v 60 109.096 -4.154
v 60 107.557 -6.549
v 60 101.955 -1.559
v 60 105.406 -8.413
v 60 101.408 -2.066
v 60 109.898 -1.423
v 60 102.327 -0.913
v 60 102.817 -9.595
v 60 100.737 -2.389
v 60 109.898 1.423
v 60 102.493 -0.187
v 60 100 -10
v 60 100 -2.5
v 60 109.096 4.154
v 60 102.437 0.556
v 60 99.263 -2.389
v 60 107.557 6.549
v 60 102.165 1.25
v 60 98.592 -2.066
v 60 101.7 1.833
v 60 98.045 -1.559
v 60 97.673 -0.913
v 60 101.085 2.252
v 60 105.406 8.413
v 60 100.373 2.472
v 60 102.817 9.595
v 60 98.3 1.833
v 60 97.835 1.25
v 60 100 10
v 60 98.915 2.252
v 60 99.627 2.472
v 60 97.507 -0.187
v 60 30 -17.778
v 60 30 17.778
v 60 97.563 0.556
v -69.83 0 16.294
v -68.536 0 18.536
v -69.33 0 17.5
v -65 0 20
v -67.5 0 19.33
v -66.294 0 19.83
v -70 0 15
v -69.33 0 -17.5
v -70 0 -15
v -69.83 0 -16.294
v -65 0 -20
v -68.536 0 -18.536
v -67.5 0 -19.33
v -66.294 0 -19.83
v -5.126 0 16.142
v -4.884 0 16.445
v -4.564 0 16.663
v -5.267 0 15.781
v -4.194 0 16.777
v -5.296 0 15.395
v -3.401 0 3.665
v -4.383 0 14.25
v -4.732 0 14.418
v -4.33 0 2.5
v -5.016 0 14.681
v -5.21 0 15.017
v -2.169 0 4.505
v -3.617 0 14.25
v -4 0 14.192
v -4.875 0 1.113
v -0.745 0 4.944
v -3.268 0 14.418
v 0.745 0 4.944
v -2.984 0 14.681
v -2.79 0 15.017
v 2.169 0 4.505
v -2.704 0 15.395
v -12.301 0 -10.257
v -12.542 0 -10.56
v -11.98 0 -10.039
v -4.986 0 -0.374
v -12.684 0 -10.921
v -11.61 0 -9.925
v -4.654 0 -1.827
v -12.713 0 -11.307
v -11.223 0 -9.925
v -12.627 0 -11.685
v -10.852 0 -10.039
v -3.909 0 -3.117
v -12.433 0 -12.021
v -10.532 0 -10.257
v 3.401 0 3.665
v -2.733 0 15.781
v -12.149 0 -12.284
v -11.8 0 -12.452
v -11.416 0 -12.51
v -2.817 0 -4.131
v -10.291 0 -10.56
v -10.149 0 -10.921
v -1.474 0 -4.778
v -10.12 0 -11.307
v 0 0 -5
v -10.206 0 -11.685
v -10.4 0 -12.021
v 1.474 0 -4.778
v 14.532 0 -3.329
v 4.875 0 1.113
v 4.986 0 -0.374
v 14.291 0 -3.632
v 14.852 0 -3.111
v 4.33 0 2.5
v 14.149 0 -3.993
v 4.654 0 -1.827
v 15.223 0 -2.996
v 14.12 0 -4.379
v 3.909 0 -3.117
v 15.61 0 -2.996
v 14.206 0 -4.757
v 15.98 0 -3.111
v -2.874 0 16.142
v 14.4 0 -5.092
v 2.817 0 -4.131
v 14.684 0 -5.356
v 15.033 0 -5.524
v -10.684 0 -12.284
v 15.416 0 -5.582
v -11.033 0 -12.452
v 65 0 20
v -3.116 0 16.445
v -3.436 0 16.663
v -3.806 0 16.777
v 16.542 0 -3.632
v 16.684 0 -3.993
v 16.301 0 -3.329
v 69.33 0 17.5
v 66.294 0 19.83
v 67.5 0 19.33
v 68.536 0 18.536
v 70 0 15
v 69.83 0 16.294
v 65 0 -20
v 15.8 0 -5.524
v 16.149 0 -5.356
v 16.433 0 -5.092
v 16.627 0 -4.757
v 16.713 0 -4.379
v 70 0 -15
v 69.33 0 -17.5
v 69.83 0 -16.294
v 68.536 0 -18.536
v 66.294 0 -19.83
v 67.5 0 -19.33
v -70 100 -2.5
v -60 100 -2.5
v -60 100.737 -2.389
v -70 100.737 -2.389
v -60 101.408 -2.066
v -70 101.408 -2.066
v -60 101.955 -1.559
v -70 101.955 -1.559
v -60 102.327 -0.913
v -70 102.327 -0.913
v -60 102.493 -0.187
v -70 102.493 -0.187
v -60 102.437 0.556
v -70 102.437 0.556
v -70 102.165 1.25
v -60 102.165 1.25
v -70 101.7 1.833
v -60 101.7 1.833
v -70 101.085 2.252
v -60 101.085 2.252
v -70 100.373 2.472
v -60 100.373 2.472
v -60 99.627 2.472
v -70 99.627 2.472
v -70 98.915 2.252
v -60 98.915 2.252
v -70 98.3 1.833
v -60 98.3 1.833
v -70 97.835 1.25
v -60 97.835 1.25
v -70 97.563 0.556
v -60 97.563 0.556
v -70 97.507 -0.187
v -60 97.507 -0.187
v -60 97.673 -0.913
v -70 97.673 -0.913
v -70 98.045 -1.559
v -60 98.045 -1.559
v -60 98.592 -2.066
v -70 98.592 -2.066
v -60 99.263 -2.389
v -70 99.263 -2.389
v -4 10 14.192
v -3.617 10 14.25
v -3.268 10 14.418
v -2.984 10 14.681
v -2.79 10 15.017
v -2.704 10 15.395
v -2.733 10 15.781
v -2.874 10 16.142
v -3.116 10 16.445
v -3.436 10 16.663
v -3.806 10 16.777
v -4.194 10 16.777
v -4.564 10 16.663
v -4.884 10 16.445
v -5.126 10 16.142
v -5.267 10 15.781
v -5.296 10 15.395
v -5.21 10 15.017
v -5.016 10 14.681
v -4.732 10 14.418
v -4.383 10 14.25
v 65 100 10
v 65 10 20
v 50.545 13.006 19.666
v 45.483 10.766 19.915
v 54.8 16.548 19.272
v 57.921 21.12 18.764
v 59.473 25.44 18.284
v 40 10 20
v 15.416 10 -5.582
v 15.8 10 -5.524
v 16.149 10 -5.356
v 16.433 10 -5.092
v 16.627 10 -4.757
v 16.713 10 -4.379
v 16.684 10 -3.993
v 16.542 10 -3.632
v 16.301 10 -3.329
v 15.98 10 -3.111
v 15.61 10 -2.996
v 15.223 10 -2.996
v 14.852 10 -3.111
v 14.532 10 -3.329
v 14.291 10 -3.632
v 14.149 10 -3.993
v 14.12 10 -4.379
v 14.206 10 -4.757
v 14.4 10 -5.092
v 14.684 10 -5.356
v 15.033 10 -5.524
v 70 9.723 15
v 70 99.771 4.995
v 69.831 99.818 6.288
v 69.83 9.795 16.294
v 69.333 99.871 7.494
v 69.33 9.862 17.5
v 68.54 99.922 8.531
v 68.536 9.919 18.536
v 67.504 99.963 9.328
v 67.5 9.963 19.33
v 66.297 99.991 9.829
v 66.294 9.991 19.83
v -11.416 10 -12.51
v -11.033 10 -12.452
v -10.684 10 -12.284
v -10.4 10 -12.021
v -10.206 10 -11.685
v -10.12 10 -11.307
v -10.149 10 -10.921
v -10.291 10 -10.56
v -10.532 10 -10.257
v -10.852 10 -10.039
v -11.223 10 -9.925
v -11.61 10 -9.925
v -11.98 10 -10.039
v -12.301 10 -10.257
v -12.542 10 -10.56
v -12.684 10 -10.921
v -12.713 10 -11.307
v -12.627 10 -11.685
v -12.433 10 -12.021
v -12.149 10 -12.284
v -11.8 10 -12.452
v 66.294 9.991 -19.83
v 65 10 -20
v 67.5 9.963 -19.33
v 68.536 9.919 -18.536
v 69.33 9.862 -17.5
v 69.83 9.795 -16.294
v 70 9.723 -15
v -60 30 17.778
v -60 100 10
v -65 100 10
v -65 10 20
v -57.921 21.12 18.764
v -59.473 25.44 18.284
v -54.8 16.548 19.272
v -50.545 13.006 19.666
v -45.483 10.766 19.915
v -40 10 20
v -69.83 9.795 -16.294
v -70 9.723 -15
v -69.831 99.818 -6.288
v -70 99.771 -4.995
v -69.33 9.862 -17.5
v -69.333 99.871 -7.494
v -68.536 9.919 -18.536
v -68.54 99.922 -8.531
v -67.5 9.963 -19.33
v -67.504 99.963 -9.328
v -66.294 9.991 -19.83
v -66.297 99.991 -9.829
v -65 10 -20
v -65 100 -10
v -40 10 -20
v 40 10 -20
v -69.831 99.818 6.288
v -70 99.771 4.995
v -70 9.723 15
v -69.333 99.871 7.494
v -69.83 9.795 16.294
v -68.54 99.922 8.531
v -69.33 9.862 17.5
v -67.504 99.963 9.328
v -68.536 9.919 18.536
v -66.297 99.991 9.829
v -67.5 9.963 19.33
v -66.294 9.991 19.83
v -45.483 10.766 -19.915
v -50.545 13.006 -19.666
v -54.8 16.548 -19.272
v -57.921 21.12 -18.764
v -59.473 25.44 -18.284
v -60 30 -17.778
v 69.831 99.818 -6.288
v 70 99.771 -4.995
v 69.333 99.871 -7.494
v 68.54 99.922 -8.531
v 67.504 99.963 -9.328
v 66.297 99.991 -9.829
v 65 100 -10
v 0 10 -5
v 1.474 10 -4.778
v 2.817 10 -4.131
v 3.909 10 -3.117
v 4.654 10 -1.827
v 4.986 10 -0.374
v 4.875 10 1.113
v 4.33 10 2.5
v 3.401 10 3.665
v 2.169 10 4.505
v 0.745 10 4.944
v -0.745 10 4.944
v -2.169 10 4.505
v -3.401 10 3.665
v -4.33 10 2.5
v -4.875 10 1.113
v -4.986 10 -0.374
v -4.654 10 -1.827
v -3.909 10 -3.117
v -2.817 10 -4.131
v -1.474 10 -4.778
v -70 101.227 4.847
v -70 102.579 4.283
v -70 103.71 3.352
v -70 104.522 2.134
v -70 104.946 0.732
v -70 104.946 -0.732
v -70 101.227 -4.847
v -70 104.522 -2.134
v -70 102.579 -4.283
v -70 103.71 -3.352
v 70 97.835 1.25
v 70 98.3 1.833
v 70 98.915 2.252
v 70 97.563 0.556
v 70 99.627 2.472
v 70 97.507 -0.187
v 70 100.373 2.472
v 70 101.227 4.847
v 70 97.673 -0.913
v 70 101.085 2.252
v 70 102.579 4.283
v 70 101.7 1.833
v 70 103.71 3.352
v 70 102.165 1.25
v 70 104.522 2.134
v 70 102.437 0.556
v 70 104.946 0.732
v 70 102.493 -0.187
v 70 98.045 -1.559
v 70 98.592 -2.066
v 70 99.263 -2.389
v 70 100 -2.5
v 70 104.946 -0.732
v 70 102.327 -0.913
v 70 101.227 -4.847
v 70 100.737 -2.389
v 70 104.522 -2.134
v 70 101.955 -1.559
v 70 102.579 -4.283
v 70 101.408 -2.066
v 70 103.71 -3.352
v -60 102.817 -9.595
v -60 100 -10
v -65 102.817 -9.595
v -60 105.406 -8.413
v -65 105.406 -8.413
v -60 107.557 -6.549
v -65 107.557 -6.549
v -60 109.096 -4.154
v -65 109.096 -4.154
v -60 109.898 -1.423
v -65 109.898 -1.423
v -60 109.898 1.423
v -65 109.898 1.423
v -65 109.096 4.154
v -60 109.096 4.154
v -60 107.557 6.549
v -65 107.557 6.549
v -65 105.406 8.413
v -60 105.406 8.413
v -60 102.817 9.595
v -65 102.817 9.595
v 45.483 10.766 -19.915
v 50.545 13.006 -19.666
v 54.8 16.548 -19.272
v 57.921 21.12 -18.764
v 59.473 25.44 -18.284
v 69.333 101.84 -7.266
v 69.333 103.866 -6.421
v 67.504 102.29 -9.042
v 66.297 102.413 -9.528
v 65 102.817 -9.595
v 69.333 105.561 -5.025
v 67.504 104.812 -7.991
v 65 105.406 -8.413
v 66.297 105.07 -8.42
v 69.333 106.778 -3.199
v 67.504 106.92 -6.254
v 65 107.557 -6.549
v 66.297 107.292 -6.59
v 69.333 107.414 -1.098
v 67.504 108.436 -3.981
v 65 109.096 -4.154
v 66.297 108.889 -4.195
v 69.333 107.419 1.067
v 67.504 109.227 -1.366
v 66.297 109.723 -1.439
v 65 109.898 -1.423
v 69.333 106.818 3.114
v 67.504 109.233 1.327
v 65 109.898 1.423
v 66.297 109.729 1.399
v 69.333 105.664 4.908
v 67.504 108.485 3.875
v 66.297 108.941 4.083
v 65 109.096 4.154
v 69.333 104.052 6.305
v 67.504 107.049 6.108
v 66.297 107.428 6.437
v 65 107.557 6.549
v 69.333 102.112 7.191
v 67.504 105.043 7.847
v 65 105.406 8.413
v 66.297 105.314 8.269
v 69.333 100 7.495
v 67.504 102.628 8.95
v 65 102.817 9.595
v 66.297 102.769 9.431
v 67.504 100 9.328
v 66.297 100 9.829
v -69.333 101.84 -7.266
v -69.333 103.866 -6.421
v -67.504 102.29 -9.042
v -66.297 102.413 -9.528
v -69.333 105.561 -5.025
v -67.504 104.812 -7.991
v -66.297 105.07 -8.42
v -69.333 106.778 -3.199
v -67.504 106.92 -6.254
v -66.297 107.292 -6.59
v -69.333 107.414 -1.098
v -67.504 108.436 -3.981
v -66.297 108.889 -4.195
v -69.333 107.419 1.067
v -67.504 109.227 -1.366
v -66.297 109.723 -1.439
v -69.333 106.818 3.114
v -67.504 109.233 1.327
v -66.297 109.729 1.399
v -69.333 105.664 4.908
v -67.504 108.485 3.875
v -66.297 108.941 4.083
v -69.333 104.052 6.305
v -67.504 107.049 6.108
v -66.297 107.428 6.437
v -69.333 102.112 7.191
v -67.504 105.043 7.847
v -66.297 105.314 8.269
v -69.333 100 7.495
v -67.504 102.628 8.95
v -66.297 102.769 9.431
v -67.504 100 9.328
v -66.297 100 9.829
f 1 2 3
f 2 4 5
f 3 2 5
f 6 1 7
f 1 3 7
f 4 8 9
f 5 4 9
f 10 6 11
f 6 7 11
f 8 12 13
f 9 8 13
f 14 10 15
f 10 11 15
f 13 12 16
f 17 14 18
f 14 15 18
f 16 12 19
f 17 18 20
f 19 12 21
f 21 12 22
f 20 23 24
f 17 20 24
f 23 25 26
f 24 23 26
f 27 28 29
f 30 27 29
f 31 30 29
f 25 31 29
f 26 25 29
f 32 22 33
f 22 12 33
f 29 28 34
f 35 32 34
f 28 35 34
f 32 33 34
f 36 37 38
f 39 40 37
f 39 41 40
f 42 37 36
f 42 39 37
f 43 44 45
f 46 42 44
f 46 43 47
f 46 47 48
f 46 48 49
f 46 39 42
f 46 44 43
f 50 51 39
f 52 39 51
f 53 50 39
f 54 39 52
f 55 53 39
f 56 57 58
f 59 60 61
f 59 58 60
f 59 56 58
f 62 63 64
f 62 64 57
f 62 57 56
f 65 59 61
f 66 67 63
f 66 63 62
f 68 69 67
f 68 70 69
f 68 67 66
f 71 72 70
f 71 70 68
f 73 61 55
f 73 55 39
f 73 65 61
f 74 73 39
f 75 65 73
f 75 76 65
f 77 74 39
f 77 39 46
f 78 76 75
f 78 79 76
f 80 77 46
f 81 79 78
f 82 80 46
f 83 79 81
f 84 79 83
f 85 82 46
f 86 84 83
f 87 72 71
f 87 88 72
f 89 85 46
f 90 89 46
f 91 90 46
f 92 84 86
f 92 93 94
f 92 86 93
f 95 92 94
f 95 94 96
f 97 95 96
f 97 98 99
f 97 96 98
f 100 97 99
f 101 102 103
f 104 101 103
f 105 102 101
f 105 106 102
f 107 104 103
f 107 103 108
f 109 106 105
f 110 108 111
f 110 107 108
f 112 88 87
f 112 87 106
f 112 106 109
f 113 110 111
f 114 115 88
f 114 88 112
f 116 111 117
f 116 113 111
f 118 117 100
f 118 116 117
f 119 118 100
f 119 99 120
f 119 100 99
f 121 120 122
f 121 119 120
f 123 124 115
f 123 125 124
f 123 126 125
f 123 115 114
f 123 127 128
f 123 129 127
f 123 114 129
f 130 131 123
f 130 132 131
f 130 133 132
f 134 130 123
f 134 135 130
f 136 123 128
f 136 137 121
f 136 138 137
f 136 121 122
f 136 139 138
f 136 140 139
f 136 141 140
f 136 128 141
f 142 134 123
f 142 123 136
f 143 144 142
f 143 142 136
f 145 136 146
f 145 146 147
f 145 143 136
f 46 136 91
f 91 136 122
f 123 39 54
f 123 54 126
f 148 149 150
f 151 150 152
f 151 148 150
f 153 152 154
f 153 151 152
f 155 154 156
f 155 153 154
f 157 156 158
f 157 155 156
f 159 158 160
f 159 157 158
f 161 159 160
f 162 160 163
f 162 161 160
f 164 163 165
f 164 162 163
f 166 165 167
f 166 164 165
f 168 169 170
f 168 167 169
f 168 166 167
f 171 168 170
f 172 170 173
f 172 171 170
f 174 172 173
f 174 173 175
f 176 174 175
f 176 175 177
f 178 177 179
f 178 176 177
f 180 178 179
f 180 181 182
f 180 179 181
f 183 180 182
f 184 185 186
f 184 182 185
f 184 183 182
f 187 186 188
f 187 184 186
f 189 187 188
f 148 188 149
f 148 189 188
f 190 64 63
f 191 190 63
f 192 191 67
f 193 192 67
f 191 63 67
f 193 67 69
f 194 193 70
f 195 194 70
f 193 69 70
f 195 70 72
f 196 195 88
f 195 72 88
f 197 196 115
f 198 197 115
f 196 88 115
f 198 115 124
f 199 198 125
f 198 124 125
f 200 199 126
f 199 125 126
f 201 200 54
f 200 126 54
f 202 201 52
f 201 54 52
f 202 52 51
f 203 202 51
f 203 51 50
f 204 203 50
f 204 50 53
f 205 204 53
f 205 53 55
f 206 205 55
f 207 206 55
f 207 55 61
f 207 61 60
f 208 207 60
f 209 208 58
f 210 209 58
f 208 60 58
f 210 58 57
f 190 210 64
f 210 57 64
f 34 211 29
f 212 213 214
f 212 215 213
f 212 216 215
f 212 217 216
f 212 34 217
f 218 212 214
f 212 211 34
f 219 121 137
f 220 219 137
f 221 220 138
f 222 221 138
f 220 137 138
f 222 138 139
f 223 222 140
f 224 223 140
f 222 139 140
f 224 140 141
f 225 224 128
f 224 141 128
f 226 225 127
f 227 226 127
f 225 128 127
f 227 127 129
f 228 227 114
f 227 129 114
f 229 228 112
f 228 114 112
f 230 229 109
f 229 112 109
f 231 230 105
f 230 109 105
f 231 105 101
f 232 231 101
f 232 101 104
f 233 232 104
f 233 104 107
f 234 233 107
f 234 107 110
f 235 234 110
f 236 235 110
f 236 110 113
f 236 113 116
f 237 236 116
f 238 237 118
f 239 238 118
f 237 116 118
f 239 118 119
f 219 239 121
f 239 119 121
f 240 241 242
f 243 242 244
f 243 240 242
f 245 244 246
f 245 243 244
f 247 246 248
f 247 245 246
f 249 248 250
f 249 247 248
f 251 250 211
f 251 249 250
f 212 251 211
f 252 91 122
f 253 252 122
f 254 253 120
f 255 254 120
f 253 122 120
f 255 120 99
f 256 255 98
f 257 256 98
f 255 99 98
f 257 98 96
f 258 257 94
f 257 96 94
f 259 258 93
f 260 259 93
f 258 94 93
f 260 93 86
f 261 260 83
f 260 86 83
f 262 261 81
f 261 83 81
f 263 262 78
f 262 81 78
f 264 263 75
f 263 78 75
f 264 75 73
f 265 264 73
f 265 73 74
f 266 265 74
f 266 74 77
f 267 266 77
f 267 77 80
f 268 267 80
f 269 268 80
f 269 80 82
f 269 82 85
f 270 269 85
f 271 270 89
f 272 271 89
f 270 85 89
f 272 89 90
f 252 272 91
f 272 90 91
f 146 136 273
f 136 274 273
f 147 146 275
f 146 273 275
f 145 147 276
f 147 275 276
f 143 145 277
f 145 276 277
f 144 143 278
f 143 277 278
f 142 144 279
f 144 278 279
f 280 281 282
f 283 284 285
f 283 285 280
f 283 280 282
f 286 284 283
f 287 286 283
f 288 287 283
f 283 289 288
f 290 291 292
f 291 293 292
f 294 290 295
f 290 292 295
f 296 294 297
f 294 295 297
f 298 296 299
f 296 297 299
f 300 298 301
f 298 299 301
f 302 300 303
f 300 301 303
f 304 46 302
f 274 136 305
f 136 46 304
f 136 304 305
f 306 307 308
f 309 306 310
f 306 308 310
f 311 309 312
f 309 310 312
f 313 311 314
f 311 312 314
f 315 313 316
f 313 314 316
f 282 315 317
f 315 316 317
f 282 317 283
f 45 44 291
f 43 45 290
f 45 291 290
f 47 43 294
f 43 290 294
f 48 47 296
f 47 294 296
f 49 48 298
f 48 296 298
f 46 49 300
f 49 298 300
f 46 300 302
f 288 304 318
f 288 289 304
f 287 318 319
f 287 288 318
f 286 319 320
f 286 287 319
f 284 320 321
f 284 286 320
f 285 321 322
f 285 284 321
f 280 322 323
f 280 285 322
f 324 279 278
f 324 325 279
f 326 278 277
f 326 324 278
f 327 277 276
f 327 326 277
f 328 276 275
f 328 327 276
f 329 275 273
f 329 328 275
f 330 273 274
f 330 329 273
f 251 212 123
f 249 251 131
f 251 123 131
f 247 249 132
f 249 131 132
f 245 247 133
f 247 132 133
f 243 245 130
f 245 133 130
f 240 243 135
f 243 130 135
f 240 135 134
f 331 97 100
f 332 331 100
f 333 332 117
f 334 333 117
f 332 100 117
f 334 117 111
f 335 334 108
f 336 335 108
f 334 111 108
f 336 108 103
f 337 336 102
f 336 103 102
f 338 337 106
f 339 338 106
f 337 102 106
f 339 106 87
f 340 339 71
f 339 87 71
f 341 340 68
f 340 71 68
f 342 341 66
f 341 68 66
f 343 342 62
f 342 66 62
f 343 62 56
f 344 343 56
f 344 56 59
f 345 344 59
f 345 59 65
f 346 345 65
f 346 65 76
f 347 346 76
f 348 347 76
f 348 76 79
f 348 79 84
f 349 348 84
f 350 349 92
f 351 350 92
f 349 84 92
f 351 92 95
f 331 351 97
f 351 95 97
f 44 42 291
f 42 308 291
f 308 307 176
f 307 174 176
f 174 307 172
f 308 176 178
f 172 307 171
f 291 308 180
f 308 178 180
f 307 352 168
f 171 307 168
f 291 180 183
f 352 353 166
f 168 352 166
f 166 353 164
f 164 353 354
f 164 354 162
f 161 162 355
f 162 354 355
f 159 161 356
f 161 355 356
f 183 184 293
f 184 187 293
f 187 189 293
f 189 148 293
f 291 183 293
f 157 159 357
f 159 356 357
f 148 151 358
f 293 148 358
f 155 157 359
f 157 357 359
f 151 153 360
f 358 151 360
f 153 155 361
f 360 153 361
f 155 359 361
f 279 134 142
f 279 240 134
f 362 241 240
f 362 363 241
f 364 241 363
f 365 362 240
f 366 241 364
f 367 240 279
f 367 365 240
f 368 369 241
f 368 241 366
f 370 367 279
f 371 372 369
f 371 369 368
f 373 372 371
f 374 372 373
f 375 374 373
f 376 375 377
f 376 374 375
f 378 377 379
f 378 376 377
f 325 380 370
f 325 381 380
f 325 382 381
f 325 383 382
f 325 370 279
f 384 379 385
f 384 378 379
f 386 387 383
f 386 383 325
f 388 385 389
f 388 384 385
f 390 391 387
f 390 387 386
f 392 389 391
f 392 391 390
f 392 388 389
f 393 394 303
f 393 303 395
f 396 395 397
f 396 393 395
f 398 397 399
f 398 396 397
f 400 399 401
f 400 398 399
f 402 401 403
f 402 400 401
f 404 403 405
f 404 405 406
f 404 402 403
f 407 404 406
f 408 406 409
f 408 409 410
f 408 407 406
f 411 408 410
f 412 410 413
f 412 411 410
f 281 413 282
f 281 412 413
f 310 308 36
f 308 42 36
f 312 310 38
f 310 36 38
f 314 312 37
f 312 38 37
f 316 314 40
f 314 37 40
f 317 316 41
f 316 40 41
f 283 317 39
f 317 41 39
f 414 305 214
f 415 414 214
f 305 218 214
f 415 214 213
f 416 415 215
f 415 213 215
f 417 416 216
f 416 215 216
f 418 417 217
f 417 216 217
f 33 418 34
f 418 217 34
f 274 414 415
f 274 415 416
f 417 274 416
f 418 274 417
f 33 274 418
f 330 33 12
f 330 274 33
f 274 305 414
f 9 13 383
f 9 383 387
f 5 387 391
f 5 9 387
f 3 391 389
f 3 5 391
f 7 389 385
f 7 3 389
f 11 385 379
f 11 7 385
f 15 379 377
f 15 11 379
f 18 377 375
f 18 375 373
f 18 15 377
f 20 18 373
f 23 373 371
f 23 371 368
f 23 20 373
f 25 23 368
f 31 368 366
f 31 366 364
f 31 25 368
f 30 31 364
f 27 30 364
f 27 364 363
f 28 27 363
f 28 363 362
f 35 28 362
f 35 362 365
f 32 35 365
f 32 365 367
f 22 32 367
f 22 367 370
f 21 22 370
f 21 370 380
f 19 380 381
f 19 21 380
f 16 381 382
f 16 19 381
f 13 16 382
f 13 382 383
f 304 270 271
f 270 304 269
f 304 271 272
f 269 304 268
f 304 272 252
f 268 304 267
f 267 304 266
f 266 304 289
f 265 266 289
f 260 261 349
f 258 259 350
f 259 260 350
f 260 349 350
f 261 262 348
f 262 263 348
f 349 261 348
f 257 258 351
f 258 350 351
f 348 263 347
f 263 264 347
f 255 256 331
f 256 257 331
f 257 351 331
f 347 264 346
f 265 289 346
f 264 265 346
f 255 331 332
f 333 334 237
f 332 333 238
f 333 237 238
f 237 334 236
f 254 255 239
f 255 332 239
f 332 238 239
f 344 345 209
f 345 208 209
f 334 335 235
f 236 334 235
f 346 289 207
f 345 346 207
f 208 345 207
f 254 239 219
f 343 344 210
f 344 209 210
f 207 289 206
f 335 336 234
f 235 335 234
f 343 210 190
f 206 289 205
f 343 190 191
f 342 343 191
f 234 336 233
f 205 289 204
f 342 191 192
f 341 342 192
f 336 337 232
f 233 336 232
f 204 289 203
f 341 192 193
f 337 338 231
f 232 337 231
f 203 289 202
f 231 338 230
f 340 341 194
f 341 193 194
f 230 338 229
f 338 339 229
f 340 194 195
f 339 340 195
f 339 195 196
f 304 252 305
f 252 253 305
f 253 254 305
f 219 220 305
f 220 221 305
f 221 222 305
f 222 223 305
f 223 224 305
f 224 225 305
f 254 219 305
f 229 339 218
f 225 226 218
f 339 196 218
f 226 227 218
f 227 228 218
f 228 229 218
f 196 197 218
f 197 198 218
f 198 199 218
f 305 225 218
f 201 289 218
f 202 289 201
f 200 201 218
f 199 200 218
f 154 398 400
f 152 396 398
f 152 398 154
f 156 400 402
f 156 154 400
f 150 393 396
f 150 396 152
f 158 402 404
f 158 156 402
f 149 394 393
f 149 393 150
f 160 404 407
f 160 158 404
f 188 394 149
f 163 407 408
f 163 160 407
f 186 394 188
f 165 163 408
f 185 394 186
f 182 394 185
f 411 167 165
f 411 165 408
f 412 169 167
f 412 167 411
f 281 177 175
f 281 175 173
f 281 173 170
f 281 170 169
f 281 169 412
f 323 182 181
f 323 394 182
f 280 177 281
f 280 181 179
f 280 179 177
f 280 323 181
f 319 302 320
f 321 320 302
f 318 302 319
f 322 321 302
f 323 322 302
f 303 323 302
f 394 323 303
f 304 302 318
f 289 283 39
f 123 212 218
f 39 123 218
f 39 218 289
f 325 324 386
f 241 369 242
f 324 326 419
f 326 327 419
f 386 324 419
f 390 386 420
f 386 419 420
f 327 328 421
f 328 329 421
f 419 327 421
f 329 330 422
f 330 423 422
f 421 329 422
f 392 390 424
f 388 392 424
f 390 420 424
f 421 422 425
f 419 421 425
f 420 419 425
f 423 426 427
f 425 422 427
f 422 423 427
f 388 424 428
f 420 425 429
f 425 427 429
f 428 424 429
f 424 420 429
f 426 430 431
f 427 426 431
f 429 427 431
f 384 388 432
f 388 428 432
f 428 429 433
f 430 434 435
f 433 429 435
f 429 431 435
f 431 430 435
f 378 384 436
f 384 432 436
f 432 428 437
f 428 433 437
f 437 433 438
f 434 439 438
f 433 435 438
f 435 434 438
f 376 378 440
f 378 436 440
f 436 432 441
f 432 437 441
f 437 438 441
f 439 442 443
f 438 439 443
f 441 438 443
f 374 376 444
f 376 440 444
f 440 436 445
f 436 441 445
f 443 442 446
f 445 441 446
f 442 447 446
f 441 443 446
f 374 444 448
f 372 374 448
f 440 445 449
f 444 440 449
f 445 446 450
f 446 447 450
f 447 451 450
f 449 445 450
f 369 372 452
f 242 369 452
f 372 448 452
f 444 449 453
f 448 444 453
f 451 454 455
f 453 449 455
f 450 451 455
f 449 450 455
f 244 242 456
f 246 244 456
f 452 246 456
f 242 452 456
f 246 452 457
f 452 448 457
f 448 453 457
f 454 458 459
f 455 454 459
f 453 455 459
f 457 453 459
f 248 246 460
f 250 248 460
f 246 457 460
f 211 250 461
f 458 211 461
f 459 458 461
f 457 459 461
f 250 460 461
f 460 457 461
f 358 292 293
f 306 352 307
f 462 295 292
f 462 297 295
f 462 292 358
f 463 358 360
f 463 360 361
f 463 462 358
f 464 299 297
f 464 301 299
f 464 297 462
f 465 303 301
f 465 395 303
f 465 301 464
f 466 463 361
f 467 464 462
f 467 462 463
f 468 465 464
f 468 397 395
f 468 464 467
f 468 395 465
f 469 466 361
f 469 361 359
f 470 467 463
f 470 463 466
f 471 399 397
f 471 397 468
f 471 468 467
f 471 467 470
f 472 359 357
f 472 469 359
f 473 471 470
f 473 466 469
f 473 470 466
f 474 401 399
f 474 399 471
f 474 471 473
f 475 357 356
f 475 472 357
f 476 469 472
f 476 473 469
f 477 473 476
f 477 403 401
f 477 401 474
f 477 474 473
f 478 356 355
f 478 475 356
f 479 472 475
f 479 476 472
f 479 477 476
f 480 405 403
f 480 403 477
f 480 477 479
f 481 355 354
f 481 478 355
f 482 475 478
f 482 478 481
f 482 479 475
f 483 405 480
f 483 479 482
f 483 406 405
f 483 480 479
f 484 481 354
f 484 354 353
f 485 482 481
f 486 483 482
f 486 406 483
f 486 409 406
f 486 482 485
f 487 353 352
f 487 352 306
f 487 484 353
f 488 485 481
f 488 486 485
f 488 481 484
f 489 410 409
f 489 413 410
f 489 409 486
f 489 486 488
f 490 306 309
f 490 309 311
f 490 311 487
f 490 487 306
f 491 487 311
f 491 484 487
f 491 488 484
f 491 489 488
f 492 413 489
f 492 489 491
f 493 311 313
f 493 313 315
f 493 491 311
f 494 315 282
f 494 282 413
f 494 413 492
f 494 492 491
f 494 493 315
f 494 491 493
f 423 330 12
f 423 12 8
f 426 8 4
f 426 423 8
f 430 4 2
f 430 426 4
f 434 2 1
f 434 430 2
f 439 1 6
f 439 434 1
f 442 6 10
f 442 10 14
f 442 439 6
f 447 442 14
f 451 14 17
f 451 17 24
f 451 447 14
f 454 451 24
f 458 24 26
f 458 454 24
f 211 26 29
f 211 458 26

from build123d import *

# Parameters (mm, degrees)
SKETCH1_R           = 2.5
BOSS_EXTRUDE1_DEPTH = 70
CUT_EXTRUDE1_START  = -10
SKETCH2_W           = 120
SKETCH2_H           = 40
CUT_EXTRUDE1_DEPTH  = 110
SKETCH3_R           = 1.3
SKETCH3_R_2         = 5
CUT_EXTRUDE2_DEPTH  = 10
FILLET1_R           = 5
FILLET2_R           = 20


with BuildPart() as part:
    # Sketch1 → Boss-Extrude1 (new, symmetric)
    with BuildSketch(Plane(origin=(0, 0, 0), x_dir=(0, 0, -1), z_dir=(1, 0, 0))):
        with BuildLine():
            Line((-20, 0), (20, 0))
            Line((20, 0), (20, 10))
            Line((20, 10), (10, 100))
            ThreePointArc((10, 100), (0, 110), (-10, 100))
            Line((-10, 100), (-20, 10))
            Line((-20, 10), (-20, 0))
        make_face()
        with Locations((0, 100)):
            Circle(SKETCH1_R, mode=Mode.SUBTRACT)
    extrude(amount=BOSS_EXTRUDE1_DEPTH, both=True)

    # Sketch2 → Cut-Extrude1 (cut)
    with BuildSketch(Plane.XZ.offset(CUT_EXTRUDE1_START)):
        Rectangle(SKETCH2_W, SKETCH2_H)
    extrude(amount=-CUT_EXTRUDE1_DEPTH, mode=Mode.SUBTRACT)

    # Sketch3 → Cut-Extrude2 (cut)
    with BuildSketch(Plane.XZ):
        with Locations(Location((-4, 15.491933385, 0), (0, 0, 270))):
            Circle(SKETCH3_R)
        with Locations(Location((15.416407865, -4.281865077, 0), (0, 0, 270))):
            Circle(SKETCH3_R)
        with Locations(Location((-11.416407865, -11.210068308, 0), (0, 0, 270))):
            Circle(SKETCH3_R)
        with Locations(Location((0, 0, 0), (0, 0, 270))):
            Circle(SKETCH3_R_2)
    extrude(amount=-CUT_EXTRUDE2_DEPTH, mode=Mode.SUBTRACT)

    # Fillet1
    fillet1_edges = [part.edges().sort_by_distance(p)[0] for p in [
        (70, 5, -20),
        (70, 55, -15),
        (70, 110, 0),
        (70, 55, 15),
        (70, 5, 20),
        (-70, 55, 15),
        (-70, 110, 0),
        (-70, 55, -15),
        (-70, 5, -20),
        (-70, 5, 20),
    ]]
    fillet(fillet1_edges, radius=FILLET1_R)

    # Fillet2
    fillet2_edges = [part.edges().sort_by_distance(p)[0] for p in [
        (-60, 10, 0),
        (60, 10, 0),
    ]]
    fillet(fillet2_edges, radius=FILLET2_R)


solid = part.part
